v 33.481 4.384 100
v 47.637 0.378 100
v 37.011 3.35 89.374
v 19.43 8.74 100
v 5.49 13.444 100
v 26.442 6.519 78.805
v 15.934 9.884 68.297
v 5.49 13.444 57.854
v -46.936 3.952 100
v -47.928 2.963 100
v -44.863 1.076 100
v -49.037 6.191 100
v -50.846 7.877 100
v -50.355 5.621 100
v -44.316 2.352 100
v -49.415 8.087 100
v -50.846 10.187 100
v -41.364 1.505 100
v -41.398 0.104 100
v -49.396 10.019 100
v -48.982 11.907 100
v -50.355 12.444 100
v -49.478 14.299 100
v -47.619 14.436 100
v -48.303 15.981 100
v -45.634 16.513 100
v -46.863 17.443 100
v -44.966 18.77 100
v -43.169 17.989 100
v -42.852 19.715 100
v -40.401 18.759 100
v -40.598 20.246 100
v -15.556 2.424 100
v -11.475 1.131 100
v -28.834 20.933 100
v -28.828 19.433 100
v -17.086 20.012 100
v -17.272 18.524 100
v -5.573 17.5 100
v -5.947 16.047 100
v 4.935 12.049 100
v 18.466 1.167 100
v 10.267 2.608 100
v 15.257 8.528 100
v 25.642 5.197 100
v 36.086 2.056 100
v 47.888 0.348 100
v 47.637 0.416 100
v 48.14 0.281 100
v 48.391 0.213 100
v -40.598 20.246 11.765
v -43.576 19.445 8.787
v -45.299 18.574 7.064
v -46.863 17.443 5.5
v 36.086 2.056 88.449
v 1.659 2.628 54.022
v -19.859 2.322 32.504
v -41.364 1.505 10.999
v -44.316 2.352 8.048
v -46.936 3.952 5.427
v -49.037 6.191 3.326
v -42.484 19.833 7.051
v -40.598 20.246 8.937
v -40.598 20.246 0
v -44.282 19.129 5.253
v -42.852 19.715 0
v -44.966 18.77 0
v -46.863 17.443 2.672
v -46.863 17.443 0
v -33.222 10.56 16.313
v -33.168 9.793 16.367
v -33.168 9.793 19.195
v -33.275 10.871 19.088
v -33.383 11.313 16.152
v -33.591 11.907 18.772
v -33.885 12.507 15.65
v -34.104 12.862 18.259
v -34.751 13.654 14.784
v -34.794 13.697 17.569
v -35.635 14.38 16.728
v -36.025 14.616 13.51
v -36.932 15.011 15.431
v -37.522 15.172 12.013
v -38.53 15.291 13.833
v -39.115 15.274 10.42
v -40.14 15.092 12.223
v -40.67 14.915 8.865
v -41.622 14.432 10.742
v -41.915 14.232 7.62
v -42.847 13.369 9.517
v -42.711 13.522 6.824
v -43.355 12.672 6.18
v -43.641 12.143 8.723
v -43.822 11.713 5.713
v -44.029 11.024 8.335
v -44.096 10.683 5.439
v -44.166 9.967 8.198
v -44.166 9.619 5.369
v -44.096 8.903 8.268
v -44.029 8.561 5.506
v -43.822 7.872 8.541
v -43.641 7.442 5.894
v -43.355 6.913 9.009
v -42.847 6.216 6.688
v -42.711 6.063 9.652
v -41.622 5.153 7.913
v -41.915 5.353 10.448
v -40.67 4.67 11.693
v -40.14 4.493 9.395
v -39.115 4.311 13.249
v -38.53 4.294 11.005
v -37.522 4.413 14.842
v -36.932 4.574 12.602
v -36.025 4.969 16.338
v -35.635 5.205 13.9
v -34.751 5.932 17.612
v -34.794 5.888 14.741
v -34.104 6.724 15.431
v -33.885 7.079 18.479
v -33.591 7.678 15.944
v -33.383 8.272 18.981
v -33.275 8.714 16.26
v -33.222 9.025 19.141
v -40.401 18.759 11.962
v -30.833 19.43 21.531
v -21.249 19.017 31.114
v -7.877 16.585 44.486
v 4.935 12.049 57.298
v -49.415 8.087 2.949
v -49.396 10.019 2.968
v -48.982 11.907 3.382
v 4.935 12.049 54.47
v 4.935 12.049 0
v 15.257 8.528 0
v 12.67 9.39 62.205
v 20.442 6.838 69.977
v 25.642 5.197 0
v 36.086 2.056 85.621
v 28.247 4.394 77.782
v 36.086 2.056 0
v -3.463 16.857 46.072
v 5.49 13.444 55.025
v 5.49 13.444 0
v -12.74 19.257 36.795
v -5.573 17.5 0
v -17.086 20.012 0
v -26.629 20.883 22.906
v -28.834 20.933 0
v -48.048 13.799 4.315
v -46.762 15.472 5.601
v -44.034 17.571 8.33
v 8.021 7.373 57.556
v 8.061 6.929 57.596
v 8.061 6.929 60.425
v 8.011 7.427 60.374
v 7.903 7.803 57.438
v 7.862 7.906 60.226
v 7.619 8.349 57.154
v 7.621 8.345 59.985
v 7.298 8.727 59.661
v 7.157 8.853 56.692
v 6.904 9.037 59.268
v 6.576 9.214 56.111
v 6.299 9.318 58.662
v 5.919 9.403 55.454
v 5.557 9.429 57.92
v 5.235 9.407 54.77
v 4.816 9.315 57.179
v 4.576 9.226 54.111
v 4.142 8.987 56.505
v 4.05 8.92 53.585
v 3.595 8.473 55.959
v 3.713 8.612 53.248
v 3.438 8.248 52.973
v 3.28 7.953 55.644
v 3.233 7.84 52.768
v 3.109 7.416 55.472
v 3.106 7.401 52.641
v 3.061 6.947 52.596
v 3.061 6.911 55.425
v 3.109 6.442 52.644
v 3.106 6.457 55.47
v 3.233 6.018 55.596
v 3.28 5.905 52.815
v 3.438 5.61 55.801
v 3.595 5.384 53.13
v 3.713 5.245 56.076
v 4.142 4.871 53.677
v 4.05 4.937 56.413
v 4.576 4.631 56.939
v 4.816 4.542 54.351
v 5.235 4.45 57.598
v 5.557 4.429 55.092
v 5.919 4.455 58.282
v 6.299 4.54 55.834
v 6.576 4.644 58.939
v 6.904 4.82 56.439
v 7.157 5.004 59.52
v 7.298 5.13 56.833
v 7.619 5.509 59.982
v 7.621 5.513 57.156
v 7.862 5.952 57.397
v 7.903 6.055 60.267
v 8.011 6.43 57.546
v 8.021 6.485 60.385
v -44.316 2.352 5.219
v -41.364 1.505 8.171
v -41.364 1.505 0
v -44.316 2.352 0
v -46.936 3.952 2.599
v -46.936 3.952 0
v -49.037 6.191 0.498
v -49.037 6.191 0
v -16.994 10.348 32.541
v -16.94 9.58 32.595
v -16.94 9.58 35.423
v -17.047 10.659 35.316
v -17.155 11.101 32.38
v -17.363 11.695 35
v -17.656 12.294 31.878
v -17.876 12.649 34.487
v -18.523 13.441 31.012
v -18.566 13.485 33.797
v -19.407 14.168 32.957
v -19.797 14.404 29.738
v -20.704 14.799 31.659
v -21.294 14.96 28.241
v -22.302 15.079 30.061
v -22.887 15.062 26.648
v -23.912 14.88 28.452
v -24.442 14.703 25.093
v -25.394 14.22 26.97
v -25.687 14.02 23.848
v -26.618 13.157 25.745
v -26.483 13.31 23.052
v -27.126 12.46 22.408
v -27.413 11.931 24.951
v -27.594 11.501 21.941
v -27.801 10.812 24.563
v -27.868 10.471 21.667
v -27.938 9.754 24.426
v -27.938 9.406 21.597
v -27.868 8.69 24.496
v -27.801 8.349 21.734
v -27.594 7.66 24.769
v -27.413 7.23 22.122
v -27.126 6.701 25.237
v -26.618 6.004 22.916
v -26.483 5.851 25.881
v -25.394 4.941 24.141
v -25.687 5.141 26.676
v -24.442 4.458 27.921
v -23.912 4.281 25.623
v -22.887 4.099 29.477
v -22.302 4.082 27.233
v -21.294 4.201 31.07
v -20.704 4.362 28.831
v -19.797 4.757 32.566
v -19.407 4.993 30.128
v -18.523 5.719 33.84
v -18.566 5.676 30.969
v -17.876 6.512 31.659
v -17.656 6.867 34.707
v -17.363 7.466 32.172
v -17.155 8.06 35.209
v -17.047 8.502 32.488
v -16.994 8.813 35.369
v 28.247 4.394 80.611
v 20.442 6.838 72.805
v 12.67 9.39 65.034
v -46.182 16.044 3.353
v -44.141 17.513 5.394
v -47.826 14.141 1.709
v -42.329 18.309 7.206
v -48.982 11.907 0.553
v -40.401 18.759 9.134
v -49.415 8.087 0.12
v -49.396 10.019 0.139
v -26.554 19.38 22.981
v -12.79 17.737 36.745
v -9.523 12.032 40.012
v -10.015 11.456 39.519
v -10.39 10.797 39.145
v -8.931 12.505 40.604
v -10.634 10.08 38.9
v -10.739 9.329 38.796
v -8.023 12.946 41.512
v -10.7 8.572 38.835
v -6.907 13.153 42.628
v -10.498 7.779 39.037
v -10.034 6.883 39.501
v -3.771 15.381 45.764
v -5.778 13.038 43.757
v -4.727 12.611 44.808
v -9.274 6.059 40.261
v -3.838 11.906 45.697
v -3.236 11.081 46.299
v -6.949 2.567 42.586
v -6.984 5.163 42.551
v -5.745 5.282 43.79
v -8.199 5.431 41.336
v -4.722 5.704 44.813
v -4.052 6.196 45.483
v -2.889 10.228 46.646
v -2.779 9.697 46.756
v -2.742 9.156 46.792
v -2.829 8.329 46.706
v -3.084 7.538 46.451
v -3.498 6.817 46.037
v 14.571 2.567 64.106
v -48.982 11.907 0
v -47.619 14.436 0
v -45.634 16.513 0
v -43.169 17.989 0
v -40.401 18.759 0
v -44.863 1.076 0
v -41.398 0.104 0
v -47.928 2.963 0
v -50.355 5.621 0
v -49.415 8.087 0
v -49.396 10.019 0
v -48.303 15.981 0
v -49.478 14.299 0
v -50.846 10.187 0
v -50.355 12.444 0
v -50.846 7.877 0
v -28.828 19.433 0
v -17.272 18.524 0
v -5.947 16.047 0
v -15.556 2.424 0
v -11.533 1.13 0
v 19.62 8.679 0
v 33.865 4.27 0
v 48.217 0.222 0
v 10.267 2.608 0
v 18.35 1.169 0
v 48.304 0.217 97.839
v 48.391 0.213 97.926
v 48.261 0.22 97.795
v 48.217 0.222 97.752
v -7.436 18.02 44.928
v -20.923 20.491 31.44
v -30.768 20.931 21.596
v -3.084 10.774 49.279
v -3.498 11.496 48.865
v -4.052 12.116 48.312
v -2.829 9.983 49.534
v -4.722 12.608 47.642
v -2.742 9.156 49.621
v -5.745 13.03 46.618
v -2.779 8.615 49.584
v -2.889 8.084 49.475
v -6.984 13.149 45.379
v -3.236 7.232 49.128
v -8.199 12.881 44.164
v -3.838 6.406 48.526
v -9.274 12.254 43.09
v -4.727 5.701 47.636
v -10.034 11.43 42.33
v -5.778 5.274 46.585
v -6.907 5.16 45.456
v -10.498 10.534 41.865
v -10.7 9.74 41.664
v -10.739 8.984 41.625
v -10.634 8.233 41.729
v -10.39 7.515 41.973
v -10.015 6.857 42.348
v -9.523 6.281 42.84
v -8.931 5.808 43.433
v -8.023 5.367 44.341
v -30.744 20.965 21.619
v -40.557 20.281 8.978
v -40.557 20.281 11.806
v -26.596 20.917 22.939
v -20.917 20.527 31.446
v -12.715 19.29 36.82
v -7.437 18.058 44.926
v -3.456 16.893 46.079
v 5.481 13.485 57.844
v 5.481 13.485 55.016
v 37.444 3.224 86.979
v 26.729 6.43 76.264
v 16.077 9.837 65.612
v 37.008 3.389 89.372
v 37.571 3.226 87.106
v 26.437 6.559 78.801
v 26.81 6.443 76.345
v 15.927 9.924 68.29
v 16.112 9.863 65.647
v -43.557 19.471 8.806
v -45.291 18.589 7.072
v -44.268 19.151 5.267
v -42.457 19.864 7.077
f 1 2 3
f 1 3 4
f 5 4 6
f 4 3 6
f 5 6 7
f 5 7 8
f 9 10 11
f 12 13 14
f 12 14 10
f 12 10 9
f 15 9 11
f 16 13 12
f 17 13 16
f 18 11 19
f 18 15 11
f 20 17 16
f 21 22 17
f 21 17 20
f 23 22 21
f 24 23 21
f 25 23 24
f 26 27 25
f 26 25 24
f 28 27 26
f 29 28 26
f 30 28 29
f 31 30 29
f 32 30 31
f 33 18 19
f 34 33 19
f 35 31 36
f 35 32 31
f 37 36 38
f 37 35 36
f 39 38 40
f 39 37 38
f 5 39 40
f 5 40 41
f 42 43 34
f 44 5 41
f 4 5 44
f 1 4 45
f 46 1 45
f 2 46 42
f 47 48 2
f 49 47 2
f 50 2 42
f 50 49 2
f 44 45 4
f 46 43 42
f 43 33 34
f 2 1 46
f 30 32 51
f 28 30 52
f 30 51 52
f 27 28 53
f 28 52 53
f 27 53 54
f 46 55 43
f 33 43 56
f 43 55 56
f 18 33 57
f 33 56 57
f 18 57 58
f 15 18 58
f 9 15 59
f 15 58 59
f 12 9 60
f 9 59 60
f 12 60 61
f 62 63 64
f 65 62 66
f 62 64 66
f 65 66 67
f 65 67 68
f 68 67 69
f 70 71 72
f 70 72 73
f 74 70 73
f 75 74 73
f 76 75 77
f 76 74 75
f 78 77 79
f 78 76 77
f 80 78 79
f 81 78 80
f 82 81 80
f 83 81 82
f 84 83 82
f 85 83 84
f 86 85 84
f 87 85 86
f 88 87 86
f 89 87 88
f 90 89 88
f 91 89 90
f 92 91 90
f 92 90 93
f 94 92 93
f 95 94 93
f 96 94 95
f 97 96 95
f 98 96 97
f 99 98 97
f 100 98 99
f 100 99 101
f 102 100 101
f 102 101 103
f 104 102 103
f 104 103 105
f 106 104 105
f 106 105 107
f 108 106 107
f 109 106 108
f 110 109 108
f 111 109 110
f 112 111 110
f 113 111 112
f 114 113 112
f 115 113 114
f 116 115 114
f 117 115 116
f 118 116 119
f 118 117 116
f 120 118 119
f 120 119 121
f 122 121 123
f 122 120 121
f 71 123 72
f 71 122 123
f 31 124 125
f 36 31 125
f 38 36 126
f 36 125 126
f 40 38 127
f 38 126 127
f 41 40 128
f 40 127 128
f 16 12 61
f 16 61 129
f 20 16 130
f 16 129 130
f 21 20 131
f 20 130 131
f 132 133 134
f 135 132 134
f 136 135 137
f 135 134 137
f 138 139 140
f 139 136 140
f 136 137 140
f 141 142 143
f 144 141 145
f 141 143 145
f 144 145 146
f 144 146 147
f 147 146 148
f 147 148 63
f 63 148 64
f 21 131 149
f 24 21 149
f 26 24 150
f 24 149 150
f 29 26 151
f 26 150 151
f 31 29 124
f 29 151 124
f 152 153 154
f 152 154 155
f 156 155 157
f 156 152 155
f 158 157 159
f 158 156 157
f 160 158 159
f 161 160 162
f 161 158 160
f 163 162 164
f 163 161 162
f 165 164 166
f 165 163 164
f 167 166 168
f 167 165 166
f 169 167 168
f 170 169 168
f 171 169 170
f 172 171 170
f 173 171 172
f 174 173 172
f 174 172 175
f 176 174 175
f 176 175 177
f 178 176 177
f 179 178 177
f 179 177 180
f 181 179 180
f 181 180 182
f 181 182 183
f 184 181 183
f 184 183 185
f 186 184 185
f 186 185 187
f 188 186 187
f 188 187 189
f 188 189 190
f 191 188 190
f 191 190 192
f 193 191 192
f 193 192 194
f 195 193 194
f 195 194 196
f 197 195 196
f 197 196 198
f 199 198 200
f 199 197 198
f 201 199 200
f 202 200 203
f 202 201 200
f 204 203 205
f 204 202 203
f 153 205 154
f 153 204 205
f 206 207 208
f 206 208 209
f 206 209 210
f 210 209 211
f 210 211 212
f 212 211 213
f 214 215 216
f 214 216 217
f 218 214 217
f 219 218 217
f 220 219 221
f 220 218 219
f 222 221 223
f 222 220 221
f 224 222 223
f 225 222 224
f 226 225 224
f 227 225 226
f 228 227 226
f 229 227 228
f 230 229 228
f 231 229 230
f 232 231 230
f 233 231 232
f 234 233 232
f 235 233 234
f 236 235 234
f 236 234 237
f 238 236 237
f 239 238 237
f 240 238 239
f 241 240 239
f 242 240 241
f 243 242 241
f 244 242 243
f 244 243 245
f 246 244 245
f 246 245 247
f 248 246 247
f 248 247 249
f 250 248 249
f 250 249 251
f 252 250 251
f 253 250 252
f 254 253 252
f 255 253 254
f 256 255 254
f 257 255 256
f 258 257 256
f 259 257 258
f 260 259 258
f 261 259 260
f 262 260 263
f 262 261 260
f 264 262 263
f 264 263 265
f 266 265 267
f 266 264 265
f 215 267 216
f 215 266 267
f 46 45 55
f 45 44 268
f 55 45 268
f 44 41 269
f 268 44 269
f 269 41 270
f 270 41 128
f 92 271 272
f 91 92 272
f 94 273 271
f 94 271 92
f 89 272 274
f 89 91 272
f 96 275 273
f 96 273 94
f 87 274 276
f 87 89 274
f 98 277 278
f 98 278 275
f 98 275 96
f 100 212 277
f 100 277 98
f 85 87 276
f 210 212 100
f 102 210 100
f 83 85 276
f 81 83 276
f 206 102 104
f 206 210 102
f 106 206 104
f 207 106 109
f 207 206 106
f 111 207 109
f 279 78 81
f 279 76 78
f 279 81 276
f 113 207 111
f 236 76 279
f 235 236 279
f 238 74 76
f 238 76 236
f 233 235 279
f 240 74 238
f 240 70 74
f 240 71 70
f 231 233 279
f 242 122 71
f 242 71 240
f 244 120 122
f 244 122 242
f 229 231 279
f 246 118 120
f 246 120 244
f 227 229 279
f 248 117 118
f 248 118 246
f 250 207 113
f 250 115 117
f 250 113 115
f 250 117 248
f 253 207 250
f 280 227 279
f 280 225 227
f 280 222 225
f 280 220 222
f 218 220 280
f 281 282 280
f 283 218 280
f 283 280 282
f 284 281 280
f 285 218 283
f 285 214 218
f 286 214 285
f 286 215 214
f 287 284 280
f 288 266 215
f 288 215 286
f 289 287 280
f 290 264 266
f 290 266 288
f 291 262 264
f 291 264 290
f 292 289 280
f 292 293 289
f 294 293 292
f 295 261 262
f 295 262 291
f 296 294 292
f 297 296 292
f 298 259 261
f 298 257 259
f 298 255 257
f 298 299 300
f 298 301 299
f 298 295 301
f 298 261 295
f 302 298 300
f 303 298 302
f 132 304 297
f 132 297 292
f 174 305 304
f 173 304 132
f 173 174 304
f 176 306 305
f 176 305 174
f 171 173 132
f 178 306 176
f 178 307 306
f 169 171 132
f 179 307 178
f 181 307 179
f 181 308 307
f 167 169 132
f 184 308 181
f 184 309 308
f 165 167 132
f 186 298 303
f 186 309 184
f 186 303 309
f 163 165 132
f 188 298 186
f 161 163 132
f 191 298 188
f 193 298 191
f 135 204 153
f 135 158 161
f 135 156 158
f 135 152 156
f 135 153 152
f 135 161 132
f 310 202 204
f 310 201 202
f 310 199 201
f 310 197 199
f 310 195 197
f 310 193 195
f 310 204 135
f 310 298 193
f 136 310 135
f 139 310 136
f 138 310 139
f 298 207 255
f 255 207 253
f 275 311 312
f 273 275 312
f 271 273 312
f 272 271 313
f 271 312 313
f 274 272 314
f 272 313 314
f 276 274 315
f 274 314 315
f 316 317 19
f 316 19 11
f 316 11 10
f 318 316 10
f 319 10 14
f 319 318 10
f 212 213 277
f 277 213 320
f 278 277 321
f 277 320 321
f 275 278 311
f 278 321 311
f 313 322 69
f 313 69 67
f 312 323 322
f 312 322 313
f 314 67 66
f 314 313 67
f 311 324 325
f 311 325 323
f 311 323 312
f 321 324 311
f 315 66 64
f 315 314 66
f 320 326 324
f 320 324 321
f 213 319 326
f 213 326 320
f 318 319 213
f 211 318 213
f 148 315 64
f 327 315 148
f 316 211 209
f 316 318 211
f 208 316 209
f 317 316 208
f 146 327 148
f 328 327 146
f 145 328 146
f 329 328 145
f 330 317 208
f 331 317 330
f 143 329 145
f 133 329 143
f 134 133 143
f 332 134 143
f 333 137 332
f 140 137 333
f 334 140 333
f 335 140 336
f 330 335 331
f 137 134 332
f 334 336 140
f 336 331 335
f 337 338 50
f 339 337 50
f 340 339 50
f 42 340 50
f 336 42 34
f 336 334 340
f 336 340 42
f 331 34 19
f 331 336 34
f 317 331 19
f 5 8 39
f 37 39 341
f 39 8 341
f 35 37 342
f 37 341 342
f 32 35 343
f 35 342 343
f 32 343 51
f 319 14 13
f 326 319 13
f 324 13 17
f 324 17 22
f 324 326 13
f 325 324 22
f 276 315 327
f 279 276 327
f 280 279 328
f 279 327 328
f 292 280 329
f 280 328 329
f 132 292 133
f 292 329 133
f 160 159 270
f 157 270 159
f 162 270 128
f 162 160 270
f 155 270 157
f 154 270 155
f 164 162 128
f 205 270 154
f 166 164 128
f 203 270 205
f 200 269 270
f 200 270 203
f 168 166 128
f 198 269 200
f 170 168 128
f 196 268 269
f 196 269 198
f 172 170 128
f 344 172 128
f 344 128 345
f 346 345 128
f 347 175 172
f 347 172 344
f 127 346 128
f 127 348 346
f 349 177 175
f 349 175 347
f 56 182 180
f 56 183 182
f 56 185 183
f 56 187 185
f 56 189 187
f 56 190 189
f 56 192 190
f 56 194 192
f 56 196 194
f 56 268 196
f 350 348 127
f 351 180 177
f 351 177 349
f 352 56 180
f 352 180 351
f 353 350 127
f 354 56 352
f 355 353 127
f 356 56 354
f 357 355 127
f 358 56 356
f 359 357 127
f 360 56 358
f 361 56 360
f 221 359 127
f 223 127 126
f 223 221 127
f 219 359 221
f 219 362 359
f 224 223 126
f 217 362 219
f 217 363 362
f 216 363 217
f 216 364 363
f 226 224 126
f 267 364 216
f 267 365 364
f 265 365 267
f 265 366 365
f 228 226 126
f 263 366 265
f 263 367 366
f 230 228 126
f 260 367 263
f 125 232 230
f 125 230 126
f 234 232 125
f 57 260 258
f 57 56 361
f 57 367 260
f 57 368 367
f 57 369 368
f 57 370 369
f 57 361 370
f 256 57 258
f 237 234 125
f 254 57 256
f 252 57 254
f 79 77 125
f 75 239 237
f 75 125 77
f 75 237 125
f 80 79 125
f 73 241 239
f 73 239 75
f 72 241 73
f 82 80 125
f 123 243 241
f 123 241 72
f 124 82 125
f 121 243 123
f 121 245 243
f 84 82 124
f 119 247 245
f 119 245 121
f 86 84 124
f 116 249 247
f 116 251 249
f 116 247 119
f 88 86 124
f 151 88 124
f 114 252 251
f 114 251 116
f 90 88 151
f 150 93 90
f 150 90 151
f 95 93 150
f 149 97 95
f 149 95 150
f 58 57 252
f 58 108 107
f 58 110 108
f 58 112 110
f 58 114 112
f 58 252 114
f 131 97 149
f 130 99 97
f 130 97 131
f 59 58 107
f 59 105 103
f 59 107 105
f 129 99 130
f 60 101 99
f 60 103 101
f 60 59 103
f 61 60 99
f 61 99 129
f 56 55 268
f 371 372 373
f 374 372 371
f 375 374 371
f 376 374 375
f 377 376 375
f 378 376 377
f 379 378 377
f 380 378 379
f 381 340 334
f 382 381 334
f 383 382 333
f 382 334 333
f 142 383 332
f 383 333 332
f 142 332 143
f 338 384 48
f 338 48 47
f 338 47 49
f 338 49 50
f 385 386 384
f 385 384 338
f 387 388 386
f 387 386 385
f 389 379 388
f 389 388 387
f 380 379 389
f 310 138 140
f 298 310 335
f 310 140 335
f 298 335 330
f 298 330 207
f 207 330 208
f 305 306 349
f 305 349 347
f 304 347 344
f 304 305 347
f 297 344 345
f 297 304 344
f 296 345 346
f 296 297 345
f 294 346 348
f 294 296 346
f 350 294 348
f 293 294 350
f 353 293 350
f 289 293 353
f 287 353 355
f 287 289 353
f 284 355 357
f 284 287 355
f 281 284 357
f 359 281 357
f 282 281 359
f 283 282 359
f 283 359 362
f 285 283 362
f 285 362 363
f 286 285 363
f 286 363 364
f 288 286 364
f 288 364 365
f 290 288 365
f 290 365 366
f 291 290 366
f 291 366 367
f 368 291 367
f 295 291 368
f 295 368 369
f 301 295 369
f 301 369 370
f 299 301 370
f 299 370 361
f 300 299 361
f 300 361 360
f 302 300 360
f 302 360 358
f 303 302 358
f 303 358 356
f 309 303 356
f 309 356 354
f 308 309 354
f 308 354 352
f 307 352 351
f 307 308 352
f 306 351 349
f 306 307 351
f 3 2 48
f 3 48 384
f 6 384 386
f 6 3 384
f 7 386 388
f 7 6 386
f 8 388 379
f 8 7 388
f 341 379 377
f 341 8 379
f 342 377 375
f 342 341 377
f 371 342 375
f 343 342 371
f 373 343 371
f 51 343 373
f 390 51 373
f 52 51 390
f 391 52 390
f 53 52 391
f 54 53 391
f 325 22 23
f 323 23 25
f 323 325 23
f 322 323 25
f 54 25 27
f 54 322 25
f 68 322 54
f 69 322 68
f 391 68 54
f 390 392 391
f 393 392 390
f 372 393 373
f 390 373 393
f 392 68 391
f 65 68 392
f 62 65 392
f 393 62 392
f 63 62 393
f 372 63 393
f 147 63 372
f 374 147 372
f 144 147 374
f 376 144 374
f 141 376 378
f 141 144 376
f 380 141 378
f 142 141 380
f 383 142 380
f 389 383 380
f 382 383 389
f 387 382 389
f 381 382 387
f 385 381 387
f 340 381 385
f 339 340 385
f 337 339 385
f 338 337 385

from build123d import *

# Parameters (mm, degrees)
F3_DEPTH = 100
F4_DEPTH = 25
F2_W     = 130.920828
F2_H     = 57.169587
F5_DEPTH = 100
F6_R     = 5.5
F6_R_2   = 4
F6_R_3   = 2.5
F7_DEPTH = 100


with BuildPart() as f3:
    # F0 (on Top) → F3 (new body)
    with BuildSketch(Plane.XY):
        with BuildLine():
            ThreePointArc((-50.955394, 8.962345), (-50.814737, 7.217467), (-50.396399, 5.517649))
            ThreePointArc((-50.396399, 5.517649), (-46.499614, 1.806953), (-41.431171, 0))
            ThreePointArc((-41.431171, 0), (3.806717, 1.130986), (49.044606, 0))
            ThreePointArc((49.044606, 0), (27.138267, 6.303353), (5.490228, 13.443548))
            ThreePointArc((5.490228, 13.443548), (-17.086444, 20.012497), (-40.598205, 20.245597))
            ThreePointArc((-40.598205, 20.245597), (-46.578725, 17.678098), (-50.396399, 12.407041))
            ThreePointArc((-50.396399, 12.407041), (-50.814737, 10.707224), (-50.955394, 8.962345))
        make_face()
        with BuildLine():
            ThreePointArc((-40.401325, 18.758555), (-17.271527, 18.523557), (4.934787, 12.048809))
            ThreePointArc((4.934787, 12.048809), (20.441613, 6.838342), (36.085862, 2.056282))
            ThreePointArc((36.085862, 2.056282), (-2.645042, 2.608034), (-41.364174, 1.505217))
            ThreePointArc((-41.364174, 1.505217), (-45.679897, 3.063858), (-49.037404, 6.191472))
            ThreePointArc((-49.037404, 6.191472), (-49.45495, 9.05371), (-48.981805, 11.907284))
            ThreePointArc((-48.981805, 11.907284), (-45.633862, 16.513045), (-40.401325, 18.758555))
        make_face(mode=Mode.SUBTRACT)
    extrude(amount=F3_DEPTH)

    # F1 (on Front) → F4 (join)
    with BuildSketch(Plane.XZ):
        Polygon((-50.949167, 1.414214), (-50.949167, 0), (-49.534954, 0), (49.050833, 98.585786), (49.050833, 100), (47.636619, 100), align=None)
    extrude(amount=-F4_DEPTH)

    # F2 (on Top) → F5 (cut)
    with BuildSketch(Plane.XY):
        with Locations((0.042133, 7.232606)):
            Rectangle(F2_W, F2_H)
        with BuildLine():
            ThreePointArc((-41.397933, 0.104339), (-46.4615, 1.912404), (-50.354612, 5.62084))
            ThreePointArc((-50.354612, 5.62084), (-50.907918, 9.032238), (-50.354612, 12.443636))
            ThreePointArc((-50.354612, 12.443636), (-46.537025, 17.713711), (-40.557266, 20.28084))
            ThreePointArc((-40.557266, 20.28084), (-17.07095, 20.047617), (5.481051, 13.484941))
            ThreePointArc((5.481051, 13.484941), (26.810456, 6.442957), (48.391087, 0.213235))
            ThreePointArc((48.391087, 0.213235), (3.495226, 1.272535), (-41.397933, 0.104339))
        make_face(mode=Mode.SUBTRACT)
    extrude(amount=F5_DEPTH, mode=Mode.SUBTRACT)

    # F6 (on Top) → F7 (cut)
    with BuildSketch(Plane.XY):
        with Locations((-38.668361, 9.792585)):
            Circle(F6_R)
        with Locations((-22.44026, 9.580453)):
            Circle(F6_R)
        with Locations((-6.742489, 9.156189)):
            Circle(F6_R_2)
        with Locations((5.561169, 6.928802)):
            Circle(F6_R_3)
    extrude(amount=F7_DEPTH, mode=Mode.SUBTRACT)


solid = f3.part
